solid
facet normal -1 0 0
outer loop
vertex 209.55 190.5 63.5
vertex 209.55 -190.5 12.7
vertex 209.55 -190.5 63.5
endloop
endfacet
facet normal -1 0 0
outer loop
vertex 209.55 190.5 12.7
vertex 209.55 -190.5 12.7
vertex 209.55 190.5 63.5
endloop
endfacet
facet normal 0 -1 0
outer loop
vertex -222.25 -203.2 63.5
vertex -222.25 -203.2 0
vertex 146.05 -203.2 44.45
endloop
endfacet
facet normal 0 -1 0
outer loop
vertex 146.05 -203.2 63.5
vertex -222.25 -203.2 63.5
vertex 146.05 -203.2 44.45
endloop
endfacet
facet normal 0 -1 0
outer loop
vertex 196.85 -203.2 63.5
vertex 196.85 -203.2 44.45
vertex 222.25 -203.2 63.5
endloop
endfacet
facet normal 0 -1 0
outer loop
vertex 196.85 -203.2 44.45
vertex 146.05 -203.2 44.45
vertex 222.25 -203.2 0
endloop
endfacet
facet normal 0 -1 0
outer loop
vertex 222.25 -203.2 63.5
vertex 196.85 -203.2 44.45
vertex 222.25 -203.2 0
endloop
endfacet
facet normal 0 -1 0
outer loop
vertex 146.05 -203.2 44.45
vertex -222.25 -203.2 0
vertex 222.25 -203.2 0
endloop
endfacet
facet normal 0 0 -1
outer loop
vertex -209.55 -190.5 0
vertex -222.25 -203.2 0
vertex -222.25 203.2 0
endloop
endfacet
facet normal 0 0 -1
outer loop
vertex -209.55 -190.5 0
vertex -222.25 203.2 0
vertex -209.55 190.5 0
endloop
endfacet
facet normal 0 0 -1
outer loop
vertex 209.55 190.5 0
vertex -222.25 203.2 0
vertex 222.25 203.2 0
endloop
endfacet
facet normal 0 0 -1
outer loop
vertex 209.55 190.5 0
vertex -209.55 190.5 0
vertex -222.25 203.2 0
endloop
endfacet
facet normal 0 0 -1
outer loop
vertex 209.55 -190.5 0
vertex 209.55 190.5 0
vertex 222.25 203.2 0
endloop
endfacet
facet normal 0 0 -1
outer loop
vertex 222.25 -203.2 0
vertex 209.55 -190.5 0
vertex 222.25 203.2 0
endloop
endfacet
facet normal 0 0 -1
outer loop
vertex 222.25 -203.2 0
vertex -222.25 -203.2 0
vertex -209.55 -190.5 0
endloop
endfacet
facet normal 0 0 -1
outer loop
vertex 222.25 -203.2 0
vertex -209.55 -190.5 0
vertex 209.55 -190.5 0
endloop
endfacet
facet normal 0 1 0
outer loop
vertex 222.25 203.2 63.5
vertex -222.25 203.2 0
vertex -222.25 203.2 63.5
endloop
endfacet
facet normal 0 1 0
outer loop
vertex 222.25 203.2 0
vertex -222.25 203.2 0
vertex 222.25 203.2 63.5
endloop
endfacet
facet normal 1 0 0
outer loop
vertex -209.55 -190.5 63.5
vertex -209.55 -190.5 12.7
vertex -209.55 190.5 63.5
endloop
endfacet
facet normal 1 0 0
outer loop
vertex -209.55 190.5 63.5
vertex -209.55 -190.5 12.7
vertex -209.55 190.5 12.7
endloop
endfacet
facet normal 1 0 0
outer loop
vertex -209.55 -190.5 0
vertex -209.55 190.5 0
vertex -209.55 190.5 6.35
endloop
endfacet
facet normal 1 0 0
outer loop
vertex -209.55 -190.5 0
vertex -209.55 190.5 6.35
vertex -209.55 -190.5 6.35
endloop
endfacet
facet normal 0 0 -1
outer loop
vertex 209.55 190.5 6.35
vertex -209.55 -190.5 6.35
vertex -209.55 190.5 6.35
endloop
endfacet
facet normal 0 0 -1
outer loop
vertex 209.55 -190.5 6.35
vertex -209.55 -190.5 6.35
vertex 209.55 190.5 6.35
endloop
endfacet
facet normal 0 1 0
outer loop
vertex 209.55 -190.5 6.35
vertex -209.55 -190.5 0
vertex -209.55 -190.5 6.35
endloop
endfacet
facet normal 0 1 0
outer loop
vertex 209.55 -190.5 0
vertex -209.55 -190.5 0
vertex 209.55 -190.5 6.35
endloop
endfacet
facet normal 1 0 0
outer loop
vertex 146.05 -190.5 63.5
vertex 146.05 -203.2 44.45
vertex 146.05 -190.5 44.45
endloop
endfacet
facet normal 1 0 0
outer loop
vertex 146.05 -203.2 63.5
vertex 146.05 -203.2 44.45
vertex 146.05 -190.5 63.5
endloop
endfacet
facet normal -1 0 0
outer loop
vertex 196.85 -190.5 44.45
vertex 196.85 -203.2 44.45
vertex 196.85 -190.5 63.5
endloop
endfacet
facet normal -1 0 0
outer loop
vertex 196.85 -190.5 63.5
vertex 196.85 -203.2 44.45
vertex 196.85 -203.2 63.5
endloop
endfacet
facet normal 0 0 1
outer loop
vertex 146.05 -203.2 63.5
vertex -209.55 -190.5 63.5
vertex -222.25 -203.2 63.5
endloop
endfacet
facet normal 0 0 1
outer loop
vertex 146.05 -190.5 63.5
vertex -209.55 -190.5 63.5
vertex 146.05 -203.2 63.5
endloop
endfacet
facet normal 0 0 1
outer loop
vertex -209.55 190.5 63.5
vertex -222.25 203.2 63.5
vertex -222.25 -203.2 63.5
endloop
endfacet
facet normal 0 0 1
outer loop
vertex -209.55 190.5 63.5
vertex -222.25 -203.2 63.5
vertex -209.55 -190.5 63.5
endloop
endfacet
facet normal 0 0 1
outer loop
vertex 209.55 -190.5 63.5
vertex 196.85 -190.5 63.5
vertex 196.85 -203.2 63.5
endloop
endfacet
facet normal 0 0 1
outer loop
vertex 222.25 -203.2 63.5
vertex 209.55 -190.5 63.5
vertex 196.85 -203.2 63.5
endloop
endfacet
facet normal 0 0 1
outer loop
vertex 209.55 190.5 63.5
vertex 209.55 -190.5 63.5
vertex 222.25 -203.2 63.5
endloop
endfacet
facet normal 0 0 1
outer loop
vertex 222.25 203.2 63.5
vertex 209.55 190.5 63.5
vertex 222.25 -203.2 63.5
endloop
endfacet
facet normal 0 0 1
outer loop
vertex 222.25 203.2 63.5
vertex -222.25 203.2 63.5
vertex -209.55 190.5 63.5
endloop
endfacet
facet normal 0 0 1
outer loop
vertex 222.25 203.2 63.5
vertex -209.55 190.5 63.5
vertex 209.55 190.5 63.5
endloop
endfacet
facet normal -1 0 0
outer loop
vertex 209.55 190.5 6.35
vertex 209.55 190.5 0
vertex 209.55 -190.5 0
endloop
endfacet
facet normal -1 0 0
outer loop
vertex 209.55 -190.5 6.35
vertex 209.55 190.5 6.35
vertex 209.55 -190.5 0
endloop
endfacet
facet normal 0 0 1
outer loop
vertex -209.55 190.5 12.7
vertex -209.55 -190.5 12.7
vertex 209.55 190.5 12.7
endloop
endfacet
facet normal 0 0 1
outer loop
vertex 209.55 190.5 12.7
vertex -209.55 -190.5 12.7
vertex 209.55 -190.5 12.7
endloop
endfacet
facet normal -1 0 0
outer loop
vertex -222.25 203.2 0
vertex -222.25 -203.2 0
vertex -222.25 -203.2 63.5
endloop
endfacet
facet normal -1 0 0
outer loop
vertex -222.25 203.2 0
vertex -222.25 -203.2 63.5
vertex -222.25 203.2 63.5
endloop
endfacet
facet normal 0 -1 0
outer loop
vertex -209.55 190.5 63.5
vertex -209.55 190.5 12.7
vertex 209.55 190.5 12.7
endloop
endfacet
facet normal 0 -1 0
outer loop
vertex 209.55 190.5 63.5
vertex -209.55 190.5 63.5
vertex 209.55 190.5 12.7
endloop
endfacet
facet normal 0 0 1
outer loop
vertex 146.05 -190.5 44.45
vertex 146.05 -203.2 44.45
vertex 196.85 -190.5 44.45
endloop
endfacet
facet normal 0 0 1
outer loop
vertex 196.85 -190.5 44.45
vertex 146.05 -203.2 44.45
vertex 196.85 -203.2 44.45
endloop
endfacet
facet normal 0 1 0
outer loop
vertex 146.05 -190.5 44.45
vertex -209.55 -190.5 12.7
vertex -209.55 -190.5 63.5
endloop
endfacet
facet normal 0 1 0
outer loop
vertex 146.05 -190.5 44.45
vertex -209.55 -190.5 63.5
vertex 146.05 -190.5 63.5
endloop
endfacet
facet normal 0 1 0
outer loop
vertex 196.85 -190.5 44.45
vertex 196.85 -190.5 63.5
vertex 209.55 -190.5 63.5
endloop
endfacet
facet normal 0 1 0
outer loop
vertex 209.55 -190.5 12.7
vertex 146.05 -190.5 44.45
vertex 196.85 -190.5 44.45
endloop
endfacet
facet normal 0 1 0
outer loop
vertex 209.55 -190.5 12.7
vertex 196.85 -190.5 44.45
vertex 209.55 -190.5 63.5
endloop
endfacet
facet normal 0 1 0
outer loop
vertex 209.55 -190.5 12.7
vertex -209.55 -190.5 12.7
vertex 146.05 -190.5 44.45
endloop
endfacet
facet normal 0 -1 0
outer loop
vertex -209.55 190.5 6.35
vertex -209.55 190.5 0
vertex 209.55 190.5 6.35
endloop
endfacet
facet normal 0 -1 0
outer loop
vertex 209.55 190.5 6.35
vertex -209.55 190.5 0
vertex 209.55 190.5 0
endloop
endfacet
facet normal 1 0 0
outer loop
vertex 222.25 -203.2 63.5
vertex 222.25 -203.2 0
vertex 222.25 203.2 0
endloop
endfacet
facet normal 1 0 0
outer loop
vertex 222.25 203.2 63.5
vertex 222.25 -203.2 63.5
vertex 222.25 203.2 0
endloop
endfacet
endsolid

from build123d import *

# Parameters (mm, degrees)
F0_W     = 444.5
F0_H     = 406.4
F0_W_2   = 419.1
F0_H_2   = 381
F1_DEPTH = 63.5
F2_W     = 419.1
F2_H     = 381
F3_DEPTH = 12.7
F4_W     = 419.1
F4_H     = 381
F5_DEPTH = 6.35
F6_W     = 50.8
F6_H     = 19.05
F7_DEPTH = 25.4


with BuildPart() as f1:
    # F0 (on Top) → F1 (new body)
    with BuildSketch(Plane.XY):
        Rectangle(F0_W, F0_H)
        Rectangle(F0_W_2, F0_H_2, mode=Mode.SUBTRACT)
    extrude(amount=F1_DEPTH)

    # F2 (on face) → F3 (join)
    with BuildSketch(Plane(origin=(0, 0, 0), x_dir=(1, 0, 0), z_dir=(0, 0, -1))):
        Rectangle(F2_W, F2_H)
    extrude(amount=-F3_DEPTH)

    # F4 (on face) → F5 (cut)
    with BuildSketch(Plane(origin=(0, 0, 0), x_dir=(1, 0, 0), z_dir=(0, 0, -1))):
        Rectangle(F4_W, F4_H)
    extrude(amount=-F5_DEPTH, mode=Mode.SUBTRACT)

    # F6 (on face) → F7 (cut)
    with BuildSketch(Plane.XZ.offset(203.2)):
        with Locations((171.45, 53.975)):
            Rectangle(F6_W, F6_H)
    extrude(amount=-F7_DEPTH, mode=Mode.SUBTRACT)


solid = f1.part
